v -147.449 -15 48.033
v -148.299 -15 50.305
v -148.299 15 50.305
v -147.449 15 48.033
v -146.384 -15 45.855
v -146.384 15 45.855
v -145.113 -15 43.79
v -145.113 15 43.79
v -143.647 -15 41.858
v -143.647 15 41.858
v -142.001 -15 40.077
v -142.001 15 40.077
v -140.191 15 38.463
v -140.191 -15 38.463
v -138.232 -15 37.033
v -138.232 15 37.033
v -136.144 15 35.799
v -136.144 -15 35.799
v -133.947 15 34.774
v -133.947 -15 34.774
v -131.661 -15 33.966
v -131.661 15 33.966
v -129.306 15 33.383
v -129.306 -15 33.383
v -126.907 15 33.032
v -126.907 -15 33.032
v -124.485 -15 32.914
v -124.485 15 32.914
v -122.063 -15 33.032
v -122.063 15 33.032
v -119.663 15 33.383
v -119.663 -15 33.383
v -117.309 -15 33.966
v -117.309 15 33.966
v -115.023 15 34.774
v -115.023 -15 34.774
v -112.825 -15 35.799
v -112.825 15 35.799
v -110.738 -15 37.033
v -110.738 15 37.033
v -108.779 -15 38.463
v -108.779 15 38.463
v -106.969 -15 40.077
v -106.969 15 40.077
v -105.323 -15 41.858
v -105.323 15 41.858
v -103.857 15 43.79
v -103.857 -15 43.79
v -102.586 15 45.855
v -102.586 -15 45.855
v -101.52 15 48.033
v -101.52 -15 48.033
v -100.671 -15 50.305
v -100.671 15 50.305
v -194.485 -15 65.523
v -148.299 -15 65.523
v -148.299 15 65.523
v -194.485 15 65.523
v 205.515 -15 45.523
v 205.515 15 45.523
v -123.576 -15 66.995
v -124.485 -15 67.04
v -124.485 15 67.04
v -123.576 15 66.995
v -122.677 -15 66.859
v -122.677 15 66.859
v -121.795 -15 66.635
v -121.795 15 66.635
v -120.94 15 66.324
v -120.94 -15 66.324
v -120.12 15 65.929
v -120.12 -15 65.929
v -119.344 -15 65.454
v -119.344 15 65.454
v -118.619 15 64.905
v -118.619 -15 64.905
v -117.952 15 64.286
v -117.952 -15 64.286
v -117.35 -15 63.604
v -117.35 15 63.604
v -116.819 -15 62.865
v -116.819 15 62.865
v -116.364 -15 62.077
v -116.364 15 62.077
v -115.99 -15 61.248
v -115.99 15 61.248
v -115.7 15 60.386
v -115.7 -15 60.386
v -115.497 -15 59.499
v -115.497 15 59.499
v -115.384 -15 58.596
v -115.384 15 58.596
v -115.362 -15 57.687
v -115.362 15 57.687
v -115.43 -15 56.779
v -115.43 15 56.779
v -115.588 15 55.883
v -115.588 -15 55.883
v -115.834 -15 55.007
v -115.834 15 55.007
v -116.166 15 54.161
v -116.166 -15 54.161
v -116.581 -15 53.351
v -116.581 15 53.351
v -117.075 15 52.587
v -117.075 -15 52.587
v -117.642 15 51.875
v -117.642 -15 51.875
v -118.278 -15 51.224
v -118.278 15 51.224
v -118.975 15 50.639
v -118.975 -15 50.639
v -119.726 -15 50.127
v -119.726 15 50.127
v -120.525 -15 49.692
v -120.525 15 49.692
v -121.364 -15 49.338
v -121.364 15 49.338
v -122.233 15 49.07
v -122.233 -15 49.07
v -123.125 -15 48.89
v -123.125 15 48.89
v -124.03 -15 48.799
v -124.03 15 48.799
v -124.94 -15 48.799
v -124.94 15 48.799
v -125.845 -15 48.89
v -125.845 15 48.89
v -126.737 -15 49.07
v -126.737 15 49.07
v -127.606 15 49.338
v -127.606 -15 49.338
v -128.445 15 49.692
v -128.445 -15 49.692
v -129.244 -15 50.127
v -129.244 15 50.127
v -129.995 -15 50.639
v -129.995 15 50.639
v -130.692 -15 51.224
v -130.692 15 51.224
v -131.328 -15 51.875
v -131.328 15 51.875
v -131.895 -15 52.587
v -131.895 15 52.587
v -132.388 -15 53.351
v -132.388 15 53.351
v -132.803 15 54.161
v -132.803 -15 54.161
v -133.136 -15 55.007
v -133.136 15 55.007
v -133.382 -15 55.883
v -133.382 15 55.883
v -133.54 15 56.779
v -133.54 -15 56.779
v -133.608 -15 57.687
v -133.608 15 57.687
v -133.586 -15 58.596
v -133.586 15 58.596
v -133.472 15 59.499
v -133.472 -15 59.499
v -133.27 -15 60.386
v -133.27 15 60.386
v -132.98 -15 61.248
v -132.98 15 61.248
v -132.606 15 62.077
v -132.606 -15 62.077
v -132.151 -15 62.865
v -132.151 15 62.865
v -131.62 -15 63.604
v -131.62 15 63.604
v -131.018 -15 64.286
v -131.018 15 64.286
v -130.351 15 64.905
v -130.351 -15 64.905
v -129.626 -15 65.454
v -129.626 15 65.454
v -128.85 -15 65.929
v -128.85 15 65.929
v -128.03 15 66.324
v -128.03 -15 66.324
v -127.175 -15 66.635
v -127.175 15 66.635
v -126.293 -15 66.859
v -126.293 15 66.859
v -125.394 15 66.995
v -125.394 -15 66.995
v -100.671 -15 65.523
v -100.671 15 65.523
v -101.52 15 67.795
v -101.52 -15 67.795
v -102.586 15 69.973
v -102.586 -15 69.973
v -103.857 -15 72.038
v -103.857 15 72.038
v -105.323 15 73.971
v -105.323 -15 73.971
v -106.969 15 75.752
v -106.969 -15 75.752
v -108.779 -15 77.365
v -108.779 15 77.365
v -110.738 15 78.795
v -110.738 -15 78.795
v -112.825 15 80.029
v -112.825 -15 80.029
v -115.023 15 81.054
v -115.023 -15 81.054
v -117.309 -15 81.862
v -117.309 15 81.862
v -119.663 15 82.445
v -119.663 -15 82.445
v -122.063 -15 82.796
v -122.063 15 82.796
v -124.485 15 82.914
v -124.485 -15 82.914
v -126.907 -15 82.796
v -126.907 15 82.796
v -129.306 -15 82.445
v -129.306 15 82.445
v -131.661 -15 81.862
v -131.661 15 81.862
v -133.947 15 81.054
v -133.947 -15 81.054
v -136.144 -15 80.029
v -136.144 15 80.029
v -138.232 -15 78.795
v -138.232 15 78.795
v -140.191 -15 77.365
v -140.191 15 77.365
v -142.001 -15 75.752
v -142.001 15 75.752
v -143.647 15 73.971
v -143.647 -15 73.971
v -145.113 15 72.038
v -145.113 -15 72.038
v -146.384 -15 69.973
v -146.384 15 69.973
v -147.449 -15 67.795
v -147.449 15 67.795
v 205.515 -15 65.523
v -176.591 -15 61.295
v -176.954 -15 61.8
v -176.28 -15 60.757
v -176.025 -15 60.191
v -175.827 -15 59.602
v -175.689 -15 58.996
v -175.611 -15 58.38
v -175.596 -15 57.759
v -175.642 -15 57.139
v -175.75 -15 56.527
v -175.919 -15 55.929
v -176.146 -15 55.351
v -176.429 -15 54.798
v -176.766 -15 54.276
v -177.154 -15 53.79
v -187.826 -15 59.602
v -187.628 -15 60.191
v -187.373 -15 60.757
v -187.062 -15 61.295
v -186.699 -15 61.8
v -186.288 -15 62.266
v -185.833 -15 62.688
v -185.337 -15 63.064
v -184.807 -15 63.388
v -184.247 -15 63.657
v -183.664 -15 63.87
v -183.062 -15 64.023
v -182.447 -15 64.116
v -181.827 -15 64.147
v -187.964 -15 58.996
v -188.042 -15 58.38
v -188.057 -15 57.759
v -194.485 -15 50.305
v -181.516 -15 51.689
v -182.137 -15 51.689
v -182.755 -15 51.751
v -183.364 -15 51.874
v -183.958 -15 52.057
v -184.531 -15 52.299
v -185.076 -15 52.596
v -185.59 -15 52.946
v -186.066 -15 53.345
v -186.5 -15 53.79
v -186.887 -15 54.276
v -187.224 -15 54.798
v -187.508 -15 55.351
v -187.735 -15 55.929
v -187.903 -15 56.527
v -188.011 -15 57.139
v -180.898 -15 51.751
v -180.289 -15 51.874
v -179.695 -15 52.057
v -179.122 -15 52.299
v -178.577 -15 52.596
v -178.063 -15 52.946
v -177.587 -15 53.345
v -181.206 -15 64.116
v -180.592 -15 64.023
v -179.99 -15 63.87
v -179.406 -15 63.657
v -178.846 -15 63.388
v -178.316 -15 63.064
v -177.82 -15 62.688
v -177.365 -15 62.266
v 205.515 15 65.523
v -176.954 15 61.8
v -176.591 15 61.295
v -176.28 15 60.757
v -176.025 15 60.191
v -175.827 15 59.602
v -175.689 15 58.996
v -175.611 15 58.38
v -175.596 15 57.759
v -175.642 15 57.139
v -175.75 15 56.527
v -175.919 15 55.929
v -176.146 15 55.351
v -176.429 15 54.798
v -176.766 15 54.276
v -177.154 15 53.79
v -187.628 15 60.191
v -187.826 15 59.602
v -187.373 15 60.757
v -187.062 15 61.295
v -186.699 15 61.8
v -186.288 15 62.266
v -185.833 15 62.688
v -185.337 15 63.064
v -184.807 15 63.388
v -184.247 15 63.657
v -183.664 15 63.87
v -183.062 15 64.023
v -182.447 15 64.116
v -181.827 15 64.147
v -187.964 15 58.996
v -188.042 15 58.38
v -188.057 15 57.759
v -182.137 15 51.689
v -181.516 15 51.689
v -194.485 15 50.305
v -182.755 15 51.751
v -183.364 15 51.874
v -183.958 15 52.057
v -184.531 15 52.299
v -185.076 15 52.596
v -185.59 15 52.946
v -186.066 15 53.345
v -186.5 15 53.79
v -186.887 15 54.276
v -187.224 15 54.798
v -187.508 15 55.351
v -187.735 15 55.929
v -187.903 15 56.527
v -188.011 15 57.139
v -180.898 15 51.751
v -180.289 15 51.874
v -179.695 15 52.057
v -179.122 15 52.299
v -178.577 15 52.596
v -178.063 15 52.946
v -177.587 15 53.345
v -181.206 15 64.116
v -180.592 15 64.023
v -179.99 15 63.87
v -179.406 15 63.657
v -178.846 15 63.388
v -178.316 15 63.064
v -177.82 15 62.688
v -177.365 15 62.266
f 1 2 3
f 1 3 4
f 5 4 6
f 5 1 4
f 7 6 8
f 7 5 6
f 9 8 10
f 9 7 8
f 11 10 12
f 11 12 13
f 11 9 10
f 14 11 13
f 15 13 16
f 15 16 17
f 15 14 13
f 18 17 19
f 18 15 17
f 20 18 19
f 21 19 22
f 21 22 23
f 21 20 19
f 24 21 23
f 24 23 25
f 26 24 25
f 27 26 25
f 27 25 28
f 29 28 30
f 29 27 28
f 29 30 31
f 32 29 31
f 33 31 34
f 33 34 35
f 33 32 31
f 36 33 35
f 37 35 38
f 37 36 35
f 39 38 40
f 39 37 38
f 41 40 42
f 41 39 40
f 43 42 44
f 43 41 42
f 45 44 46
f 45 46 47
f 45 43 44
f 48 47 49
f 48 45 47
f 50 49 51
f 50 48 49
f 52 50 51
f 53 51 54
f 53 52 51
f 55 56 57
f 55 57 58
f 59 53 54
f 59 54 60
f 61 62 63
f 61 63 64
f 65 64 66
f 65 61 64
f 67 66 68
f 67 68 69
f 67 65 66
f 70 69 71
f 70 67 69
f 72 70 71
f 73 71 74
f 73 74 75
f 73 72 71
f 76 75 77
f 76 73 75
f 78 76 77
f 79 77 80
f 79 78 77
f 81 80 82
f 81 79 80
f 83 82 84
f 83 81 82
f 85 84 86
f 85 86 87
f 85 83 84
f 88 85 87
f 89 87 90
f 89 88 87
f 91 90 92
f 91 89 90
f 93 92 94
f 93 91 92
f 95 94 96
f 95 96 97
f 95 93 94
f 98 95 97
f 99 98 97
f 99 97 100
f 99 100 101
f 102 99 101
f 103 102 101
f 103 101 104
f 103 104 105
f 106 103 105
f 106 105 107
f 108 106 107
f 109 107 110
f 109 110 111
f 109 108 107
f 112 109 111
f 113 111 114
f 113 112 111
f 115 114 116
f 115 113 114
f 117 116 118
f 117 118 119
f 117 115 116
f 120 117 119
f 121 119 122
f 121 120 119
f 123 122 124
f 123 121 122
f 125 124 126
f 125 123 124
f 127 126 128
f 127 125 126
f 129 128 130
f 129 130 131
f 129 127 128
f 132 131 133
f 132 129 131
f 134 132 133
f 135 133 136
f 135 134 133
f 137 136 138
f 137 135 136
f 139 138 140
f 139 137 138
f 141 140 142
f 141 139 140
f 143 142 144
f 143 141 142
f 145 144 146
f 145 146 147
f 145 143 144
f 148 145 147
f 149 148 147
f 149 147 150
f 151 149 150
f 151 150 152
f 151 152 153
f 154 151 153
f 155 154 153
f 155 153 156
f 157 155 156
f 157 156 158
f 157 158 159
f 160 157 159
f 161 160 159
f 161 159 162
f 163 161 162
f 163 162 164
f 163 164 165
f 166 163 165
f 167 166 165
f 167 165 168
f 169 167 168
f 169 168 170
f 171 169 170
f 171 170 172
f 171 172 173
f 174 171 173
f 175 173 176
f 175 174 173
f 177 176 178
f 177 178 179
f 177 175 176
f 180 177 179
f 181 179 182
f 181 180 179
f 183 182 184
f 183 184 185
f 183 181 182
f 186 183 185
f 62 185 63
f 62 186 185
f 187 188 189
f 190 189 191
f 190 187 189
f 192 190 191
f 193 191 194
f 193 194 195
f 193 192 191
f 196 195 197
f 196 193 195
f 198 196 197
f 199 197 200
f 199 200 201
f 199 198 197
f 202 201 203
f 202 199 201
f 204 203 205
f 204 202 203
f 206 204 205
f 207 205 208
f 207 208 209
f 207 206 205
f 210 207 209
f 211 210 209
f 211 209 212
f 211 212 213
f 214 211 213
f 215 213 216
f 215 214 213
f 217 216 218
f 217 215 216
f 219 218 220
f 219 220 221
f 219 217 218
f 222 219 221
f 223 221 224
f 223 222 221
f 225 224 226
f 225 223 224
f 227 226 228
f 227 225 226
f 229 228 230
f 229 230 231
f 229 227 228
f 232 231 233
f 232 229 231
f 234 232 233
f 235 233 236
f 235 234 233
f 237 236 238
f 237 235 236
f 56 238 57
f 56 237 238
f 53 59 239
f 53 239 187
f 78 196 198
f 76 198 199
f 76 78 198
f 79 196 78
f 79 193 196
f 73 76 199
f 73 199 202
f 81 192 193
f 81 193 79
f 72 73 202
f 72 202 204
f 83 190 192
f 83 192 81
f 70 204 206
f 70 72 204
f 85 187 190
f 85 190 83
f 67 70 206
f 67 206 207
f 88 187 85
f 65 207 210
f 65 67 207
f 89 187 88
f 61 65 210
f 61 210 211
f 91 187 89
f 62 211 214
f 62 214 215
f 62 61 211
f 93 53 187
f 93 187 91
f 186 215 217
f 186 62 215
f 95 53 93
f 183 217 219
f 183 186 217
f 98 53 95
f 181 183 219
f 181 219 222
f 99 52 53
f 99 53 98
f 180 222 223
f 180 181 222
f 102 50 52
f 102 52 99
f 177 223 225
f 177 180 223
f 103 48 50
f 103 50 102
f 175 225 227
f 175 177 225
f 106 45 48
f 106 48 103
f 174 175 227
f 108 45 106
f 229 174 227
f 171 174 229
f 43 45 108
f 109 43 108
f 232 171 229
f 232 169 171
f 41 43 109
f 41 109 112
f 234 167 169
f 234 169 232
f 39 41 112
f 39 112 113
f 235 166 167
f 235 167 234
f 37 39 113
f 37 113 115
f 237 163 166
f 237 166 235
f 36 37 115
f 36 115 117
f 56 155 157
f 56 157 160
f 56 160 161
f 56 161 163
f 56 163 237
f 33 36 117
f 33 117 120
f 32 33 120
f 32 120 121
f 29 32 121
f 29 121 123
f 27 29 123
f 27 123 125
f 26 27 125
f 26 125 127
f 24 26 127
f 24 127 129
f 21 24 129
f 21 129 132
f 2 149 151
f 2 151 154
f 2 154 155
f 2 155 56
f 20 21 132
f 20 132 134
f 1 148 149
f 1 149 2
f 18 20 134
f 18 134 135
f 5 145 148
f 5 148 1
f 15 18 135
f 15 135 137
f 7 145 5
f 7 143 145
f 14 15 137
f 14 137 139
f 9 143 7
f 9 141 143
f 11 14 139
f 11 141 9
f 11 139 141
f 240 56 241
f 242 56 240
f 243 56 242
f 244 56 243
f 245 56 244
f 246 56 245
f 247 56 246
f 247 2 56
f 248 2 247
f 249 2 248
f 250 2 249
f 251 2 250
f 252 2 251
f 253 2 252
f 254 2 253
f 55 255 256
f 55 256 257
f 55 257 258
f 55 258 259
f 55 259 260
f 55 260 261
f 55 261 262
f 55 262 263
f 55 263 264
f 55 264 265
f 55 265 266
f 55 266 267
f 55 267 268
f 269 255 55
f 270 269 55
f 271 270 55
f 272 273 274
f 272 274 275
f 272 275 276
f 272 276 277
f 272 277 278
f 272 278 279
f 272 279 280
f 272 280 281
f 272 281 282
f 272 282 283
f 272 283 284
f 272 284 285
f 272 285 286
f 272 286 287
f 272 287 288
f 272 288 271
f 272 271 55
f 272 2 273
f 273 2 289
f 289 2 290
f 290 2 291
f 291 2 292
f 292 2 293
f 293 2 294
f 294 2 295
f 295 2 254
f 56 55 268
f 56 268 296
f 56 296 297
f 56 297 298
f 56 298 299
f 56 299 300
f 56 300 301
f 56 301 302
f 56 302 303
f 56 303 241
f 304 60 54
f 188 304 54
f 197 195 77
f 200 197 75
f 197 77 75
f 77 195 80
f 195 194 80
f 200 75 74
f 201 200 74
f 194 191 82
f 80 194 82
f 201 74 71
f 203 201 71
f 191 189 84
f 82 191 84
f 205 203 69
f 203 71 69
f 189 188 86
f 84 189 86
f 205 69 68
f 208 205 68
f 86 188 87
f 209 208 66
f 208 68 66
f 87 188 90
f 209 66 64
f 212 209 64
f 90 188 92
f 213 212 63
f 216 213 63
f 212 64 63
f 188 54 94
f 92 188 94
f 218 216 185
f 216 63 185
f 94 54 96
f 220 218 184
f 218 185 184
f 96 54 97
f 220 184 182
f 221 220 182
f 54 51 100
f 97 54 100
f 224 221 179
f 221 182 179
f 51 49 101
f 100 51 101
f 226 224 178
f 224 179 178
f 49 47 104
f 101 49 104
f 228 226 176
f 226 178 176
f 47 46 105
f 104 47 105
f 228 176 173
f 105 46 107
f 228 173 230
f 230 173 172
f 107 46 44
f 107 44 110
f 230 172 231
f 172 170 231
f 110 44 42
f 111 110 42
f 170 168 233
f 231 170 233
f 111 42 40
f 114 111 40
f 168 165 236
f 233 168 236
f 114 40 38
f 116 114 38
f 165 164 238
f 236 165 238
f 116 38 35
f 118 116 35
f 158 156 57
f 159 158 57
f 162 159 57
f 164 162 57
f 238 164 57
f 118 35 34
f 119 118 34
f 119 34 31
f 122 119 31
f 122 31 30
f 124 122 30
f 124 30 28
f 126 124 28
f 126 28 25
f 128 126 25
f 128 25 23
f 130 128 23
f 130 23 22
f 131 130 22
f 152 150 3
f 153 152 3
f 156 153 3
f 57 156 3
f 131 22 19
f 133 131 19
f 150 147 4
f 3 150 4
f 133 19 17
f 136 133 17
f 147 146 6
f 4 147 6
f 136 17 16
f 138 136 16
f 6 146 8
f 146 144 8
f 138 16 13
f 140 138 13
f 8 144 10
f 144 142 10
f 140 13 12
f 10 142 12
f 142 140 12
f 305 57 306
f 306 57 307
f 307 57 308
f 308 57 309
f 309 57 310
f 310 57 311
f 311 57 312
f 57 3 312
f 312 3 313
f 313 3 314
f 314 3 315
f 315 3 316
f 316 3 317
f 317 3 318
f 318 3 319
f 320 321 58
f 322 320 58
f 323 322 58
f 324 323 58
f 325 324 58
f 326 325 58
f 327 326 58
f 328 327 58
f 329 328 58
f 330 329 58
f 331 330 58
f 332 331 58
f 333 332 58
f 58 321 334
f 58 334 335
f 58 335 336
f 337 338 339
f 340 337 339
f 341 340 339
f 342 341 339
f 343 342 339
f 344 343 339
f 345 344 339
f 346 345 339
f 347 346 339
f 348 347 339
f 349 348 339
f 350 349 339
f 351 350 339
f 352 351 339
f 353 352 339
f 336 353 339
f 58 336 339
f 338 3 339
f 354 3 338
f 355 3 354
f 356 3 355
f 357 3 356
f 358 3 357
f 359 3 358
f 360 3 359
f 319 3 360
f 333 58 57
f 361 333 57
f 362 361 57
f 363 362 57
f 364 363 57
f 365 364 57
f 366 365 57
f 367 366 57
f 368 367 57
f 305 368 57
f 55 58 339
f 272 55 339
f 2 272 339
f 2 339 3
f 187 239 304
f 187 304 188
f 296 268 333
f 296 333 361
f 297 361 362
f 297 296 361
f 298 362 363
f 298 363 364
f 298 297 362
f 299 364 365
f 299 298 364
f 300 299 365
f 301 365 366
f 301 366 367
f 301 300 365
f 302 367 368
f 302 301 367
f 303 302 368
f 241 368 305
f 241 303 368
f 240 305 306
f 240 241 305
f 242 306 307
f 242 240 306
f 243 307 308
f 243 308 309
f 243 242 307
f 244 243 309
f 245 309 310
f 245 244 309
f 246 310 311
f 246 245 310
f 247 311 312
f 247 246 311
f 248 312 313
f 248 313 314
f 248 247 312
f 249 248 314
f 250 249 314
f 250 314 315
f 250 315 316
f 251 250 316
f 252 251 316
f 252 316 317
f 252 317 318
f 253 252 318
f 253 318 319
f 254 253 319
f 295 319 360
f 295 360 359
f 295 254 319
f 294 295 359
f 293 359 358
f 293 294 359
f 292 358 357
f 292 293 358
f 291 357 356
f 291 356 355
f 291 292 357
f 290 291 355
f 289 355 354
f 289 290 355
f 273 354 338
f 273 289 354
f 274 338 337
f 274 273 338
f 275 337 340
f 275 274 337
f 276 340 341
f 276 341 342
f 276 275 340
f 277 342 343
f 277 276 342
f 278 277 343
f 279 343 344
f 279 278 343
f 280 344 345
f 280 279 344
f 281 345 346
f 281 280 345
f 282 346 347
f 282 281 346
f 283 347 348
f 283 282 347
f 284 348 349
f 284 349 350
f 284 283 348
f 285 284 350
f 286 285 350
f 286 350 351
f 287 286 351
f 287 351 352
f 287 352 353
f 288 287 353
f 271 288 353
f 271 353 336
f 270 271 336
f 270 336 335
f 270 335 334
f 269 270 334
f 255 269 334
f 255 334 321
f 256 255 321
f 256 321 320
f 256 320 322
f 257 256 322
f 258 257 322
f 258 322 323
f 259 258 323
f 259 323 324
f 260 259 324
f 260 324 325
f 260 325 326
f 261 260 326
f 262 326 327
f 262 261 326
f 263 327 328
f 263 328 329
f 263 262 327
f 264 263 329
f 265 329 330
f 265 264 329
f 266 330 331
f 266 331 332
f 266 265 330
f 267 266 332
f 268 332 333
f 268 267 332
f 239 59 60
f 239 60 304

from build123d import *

# Parameters (mm, degrees)
BOSS_EXTRUDE1_DEPTH      = 15
BOSS_EXTRUDE1_DEPTH_BACK = 15
SKETCH1_R                = 9.12611675
SKETCH1_R_2              = 6.232505418


with BuildPart() as part:
    # Sketch1 → Boss-Extrude1 (new, two sides: drawn at the far end of the back side and taken through both)
    with BuildSketch(Plane(origin=(0, 0, 0), x_dir=(1, 0, 0), z_dir=(0, 1, 0)).offset(-BOSS_EXTRUDE1_DEPTH_BACK)):
        with BuildLine():
            Line((-194.484920724, -50.304604359), (-148.298710109, -50.304604359))
            ThreePointArc((-148.298710109, -50.304604359), (-124.484920724, -32.914035031), (-100.67113134, -50.304604359))
            Line((-100.67113134, -50.304604359), (205.515079276, -45.523465704))
            Line((205.515079276, -45.523465704), (205.515079276, -65.523465704))
            Line((205.515079276, -65.523465704), (-100.67113134, -65.523465704))
            ThreePointArc((-100.67113134, -65.523465704), (-124.484920724, -82.914035031), (-148.298710109, -65.523465704))
            Line((-148.298710109, -65.523465704), (-194.484920724, -65.523465704))
            Line((-194.484920724, -65.523465704), (-194.484920724, -50.304604359))
        make_face()
        with Locations((-124.484920724, -57.914035031)):
            Circle(SKETCH1_R, mode=Mode.SUBTRACT)
        with Locations((-181.826571095, -57.914035031)):
            Circle(SKETCH1_R_2, mode=Mode.SUBTRACT)
    extrude(amount=BOSS_EXTRUDE1_DEPTH + BOSS_EXTRUDE1_DEPTH_BACK)


solid = part.part
